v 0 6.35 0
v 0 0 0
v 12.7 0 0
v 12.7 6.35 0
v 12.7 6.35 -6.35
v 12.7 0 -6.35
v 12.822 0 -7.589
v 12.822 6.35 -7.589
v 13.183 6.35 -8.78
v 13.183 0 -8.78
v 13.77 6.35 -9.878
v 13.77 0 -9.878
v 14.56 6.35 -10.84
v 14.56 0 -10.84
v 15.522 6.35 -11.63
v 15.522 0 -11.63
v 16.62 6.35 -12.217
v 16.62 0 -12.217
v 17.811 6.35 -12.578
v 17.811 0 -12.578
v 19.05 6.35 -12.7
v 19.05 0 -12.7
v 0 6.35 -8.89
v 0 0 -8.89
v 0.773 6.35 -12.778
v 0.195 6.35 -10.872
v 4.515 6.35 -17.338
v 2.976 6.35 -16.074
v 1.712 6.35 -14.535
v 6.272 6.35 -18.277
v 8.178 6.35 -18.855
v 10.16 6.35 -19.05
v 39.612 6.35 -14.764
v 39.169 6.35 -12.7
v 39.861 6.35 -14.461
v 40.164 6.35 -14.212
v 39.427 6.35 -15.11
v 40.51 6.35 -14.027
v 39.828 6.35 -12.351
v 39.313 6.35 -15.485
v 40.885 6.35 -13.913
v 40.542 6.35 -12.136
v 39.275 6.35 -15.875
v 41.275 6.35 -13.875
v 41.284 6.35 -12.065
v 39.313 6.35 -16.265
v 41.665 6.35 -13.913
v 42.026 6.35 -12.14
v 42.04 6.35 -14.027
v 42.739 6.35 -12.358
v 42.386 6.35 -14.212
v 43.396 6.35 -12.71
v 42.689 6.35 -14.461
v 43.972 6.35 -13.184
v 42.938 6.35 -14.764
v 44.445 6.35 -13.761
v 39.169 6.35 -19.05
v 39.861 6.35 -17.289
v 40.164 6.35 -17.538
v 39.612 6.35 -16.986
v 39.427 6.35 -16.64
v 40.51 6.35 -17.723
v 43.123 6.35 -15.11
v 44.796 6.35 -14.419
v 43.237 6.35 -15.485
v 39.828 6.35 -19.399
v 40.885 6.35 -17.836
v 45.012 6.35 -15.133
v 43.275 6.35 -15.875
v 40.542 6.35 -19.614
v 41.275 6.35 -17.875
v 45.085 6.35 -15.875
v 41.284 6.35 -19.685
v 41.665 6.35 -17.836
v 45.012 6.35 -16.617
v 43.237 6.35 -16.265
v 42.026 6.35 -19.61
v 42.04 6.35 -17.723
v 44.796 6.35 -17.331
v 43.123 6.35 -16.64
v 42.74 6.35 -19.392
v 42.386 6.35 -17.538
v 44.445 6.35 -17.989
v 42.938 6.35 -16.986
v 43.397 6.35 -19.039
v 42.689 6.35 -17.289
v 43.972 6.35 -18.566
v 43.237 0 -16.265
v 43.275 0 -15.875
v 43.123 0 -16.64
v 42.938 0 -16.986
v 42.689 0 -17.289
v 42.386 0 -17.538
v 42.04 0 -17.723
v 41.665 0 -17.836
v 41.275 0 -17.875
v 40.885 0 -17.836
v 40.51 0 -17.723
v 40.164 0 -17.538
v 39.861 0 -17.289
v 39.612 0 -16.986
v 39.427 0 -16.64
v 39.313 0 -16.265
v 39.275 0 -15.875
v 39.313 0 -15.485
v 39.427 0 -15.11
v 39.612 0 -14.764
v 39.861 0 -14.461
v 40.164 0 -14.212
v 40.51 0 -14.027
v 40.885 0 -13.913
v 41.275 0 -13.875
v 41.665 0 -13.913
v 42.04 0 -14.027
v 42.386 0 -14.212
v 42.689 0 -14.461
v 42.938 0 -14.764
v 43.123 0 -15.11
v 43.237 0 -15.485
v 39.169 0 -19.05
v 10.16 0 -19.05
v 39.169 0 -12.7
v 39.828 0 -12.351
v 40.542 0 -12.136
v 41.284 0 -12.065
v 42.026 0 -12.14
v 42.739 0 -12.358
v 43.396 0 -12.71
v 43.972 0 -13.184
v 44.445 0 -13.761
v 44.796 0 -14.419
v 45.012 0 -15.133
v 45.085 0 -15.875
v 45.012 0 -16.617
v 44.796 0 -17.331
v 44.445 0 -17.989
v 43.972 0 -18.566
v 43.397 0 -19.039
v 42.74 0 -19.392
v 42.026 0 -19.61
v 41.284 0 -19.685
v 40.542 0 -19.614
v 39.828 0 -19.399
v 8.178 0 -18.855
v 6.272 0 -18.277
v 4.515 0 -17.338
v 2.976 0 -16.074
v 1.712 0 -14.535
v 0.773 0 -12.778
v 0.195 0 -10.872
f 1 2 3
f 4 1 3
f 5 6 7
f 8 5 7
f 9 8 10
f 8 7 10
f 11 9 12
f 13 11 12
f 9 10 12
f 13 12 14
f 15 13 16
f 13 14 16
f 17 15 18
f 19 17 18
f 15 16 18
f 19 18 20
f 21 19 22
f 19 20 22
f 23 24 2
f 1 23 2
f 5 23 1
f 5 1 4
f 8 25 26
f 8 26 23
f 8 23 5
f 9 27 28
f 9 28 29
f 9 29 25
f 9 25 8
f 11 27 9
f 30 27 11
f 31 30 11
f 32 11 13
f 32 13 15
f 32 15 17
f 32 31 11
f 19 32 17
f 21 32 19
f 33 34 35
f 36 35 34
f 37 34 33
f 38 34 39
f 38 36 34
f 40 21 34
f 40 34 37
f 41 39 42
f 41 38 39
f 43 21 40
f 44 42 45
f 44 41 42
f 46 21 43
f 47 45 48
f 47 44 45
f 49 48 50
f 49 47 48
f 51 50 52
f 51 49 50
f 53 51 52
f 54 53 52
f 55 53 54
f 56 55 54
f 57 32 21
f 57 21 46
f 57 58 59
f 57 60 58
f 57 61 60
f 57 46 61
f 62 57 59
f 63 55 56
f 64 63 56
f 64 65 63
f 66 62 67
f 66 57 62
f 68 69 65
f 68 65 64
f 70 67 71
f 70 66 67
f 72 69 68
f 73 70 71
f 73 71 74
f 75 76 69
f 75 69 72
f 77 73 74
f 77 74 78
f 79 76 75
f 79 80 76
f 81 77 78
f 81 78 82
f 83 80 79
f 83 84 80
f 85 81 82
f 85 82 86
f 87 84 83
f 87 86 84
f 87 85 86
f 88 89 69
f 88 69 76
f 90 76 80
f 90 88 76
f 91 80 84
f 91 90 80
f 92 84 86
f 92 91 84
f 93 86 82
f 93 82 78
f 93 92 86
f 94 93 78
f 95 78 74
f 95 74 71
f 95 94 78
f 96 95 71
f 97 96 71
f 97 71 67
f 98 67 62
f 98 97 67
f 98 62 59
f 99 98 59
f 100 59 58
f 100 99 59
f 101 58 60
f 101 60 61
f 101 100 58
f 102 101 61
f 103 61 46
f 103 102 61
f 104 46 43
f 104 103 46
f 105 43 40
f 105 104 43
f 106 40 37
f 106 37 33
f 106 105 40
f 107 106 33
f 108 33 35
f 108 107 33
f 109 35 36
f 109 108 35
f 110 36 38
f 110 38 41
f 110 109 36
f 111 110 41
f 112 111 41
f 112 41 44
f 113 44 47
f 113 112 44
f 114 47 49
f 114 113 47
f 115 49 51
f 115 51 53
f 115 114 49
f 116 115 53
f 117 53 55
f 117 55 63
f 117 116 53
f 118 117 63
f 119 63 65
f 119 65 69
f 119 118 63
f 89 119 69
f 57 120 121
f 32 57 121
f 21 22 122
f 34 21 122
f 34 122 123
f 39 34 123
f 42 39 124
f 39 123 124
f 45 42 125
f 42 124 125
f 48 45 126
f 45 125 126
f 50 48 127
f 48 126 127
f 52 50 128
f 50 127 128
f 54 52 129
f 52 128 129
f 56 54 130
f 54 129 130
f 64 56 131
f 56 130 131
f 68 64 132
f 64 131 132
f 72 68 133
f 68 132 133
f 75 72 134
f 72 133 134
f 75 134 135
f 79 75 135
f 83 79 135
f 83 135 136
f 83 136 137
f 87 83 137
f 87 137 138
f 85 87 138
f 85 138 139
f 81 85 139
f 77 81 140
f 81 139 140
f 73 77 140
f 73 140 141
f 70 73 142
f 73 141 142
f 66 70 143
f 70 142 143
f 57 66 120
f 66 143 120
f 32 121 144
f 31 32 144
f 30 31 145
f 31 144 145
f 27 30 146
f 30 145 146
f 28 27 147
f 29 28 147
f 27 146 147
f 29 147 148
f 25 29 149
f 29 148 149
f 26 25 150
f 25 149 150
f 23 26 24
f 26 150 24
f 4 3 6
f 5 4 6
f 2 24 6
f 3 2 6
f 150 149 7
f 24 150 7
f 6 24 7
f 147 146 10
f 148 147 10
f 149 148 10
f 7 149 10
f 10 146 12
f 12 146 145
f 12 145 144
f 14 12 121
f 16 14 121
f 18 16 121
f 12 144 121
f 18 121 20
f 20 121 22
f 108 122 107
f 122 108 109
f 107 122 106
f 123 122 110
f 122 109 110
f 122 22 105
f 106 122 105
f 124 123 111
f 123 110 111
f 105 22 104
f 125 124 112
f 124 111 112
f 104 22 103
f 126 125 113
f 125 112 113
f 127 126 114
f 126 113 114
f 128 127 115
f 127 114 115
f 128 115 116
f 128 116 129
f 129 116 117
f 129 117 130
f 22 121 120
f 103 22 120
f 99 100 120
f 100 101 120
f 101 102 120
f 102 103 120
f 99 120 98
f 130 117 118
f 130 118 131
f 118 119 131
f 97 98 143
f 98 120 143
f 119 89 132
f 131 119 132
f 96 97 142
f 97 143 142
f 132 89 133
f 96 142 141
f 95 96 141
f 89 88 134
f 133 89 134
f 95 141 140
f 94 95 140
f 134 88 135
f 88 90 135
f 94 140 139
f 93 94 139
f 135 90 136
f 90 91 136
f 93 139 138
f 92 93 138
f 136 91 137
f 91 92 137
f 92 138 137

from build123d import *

# Parameters (mm, degrees)
SKETCH1_R           = 2
BOSS_EXTRUDE1_DEPTH = 6.35


with BuildPart() as part:
    # Sketch1 → Boss-Extrude1 (new body)
    with BuildSketch(Plane(origin=(0, 0, 0), x_dir=(1, 0, 0), z_dir=(0, 1, 0))):
        with BuildLine():
            Line((12.7, 0), (12.7, 6.35))
            ThreePointArc((12.7, 6.35), (14.559871939, 10.840128061), (19.05, 12.7))
            Line((19.05, 12.7), (39.168815004, 12.7))
            ThreePointArc((39.168815004, 12.7), (45.084999997, 15.87476101), (39.169071524, 19.05))
            Line((39.169071524, 19.05), (12.7, 19.05))
            Line((12.7, 19.05), (10.16, 19.05))
            ThreePointArc((10.16, 19.05), (2.975795103, 16.074204897), (0, 8.89))
            Line((0, 8.89), (0, 0))
            Line((0, 0), (12.7, 0))
        make_face()
        with Locations((41.275, 15.874914922)):
            Circle(SKETCH1_R, mode=Mode.SUBTRACT)
    extrude(amount=BOSS_EXTRUDE1_DEPTH)


solid = part.part
